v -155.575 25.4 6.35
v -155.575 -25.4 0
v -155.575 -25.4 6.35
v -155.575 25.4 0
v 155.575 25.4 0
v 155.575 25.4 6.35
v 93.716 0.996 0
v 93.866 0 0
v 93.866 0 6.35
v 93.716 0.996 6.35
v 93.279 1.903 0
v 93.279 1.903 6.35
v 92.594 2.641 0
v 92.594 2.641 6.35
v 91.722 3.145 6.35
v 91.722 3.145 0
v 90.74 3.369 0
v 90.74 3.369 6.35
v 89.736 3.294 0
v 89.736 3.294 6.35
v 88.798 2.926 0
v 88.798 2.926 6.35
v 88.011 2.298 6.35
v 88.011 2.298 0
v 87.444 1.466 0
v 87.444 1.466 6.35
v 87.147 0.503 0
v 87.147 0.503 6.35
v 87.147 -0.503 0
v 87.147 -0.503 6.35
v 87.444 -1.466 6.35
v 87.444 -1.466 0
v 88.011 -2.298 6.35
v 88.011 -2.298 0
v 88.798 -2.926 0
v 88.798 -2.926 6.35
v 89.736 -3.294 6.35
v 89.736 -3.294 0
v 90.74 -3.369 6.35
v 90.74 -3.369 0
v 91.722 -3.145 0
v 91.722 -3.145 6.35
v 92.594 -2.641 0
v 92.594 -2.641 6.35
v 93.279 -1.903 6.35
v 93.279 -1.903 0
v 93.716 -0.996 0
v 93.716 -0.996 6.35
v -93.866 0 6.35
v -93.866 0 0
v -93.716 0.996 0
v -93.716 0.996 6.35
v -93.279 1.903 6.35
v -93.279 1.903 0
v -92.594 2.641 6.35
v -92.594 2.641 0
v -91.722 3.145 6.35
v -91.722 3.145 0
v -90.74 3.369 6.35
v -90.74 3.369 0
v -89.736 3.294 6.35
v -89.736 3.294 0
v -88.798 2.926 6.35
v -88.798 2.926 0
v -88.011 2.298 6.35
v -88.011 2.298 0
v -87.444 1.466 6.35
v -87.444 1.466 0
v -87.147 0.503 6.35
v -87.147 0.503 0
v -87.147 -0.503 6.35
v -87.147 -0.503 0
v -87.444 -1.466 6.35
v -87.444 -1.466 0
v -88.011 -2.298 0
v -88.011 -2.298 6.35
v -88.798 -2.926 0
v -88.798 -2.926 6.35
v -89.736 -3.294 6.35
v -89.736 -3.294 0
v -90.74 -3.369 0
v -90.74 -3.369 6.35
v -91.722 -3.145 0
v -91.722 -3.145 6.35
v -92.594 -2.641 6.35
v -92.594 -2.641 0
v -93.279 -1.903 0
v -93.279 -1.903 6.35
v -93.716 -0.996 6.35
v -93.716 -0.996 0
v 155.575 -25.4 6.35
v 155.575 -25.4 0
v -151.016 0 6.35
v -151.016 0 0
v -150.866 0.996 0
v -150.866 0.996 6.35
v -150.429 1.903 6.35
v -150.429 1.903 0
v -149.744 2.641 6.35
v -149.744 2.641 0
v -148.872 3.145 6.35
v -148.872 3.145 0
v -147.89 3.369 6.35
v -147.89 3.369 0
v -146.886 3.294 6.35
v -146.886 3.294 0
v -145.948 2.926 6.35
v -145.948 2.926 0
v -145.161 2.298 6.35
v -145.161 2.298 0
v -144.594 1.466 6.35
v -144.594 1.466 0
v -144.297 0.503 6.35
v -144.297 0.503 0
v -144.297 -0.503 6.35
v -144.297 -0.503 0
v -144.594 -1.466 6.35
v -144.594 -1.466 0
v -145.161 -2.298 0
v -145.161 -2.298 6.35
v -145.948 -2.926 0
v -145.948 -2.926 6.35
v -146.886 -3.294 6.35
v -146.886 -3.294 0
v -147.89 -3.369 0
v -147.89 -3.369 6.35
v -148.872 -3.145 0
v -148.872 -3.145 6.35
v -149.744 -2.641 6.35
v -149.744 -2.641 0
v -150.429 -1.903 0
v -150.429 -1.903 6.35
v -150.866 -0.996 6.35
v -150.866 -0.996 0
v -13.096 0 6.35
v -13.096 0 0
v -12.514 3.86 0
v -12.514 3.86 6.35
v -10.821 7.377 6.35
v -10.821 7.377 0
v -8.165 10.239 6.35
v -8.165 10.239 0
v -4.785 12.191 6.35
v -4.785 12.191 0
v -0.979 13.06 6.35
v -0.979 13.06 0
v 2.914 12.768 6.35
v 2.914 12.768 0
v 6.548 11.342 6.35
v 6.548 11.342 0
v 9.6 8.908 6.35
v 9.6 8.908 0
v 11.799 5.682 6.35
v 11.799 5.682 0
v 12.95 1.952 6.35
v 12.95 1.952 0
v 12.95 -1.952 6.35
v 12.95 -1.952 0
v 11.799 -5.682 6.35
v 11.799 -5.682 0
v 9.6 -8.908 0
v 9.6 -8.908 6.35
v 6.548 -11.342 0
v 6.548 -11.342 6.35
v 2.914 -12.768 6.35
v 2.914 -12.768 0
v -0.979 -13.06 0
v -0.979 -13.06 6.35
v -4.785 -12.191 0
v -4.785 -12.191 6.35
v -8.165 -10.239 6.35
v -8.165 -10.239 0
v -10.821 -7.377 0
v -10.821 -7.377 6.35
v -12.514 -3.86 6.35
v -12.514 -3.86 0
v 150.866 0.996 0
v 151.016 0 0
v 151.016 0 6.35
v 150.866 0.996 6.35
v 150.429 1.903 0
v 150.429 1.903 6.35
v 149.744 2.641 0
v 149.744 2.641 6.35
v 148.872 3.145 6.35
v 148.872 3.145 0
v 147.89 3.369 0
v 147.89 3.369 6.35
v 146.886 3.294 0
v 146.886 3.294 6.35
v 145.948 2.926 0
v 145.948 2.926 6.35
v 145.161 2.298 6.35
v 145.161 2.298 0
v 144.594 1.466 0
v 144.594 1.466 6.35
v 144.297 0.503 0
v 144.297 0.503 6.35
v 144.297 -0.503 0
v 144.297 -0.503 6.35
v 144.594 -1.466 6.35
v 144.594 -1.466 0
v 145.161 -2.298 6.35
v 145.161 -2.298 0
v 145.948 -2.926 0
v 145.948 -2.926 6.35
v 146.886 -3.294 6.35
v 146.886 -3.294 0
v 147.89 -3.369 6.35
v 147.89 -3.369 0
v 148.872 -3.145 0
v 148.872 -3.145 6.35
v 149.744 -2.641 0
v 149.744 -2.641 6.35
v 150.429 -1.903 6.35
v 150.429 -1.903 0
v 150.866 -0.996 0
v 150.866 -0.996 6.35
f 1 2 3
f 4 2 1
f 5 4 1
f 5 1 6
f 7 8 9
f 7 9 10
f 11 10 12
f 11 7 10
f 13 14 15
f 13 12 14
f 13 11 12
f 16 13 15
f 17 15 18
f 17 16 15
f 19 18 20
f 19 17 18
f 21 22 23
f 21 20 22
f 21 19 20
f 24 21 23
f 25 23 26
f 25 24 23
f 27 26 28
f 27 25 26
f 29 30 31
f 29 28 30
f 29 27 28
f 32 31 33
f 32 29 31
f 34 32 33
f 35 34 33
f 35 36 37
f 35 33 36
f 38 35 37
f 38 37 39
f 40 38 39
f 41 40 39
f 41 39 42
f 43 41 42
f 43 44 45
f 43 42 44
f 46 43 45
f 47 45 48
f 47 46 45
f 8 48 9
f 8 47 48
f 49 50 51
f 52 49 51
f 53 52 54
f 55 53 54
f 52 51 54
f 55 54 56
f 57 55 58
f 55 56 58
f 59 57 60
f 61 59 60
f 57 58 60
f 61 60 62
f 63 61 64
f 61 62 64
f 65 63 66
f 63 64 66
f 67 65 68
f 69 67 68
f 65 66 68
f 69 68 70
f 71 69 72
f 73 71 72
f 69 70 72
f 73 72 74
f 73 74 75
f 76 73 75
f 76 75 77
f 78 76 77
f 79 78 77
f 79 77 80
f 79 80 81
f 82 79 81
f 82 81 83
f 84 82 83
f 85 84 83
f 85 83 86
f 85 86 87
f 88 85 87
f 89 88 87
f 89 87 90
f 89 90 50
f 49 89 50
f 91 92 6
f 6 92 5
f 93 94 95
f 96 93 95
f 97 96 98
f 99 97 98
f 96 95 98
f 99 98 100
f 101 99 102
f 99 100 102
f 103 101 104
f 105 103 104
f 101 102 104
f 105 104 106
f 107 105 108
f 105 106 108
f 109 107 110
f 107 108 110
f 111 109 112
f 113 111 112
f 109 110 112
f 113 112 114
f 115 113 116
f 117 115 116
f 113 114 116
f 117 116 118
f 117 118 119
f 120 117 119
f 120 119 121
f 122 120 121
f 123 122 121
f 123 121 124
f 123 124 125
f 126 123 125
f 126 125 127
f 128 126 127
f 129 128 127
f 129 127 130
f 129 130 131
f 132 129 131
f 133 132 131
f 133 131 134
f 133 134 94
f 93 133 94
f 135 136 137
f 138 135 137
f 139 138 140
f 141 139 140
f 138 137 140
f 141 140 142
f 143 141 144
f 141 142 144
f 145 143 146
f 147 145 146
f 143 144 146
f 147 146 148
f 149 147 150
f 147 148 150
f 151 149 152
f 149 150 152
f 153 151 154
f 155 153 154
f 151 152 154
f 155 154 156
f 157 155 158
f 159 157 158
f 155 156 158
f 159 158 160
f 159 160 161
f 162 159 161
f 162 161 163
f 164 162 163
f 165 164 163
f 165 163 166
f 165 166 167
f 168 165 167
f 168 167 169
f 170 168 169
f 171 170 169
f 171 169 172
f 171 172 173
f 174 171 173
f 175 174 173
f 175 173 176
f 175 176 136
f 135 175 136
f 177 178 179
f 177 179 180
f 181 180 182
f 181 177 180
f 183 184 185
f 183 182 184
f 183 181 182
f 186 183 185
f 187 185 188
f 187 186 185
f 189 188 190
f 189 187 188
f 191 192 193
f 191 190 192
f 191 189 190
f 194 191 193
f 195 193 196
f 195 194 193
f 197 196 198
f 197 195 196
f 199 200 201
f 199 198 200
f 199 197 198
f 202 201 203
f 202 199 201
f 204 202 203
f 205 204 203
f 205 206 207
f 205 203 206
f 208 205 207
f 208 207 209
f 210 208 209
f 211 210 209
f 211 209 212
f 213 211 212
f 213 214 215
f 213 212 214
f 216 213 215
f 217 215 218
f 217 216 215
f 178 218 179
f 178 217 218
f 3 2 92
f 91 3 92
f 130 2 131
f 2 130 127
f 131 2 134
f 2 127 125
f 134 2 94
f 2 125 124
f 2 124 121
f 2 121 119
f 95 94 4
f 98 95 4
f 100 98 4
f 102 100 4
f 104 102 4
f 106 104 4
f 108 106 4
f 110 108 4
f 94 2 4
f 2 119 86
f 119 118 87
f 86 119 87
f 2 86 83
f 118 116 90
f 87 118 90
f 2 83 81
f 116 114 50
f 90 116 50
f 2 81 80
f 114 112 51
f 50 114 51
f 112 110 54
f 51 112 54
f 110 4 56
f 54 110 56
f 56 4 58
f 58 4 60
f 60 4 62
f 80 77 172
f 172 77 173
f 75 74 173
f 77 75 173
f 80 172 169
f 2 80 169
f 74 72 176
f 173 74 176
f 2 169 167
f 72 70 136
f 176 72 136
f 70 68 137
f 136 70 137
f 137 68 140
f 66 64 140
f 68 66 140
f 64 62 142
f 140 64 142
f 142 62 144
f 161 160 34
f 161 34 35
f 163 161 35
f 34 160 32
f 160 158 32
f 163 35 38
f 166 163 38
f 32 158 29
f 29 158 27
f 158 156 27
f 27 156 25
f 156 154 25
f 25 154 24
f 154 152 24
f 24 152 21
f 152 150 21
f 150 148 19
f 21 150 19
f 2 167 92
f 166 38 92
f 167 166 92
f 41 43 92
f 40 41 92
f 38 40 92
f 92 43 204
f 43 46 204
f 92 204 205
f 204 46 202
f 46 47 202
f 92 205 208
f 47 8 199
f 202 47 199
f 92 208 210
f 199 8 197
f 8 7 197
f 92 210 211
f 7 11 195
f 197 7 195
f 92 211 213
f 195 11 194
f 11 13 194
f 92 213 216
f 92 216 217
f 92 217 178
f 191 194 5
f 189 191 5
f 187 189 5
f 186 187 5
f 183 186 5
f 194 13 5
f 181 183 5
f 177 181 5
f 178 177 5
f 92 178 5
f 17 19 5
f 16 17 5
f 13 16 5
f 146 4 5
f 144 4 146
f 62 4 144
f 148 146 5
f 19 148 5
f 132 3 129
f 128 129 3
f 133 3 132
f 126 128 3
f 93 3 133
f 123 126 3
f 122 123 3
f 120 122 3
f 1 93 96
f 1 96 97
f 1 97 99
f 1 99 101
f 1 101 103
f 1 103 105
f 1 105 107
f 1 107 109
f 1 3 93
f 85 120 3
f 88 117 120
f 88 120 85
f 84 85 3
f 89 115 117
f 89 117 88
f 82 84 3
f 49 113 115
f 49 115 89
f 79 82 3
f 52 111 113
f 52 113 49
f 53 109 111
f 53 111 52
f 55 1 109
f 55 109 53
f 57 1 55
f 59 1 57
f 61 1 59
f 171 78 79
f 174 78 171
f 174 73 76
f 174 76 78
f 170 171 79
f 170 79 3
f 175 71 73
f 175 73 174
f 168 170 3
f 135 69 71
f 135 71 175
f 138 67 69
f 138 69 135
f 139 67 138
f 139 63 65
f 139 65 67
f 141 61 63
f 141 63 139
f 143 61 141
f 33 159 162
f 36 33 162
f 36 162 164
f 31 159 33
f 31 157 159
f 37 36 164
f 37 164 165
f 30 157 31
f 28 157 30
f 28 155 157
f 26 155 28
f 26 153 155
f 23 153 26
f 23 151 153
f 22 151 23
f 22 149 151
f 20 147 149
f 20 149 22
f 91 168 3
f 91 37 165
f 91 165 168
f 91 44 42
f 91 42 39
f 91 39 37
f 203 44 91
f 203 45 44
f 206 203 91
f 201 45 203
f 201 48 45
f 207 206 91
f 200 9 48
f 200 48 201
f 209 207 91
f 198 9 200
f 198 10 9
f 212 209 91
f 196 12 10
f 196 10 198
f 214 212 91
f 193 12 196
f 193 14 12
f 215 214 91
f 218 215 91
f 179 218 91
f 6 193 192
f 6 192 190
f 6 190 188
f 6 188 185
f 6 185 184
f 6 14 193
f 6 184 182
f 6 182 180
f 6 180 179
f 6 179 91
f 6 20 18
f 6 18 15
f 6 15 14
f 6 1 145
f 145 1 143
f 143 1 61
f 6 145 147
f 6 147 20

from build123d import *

# Parameters (mm, degrees)
SKETCH1_W               = 311.15
SKETCH1_H               = 50.8
BOSS_EXTRUDE1_DEPTH     = 6.35
F_1_CLEARANCE_HOLE1_D   = 26.19248
F_1_4_CLEARANCE_HOLE1_D = 6.7564


with BuildPart() as part:
    # Sketch1 → Boss-Extrude1 (new body)
    with BuildSketch(Plane.XY):
        Rectangle(SKETCH1_W, SKETCH1_H)
    extrude(amount=BOSS_EXTRUDE1_DEPTH)

    # 1 Clearance Hole1 (through all)
    with Locations(Plane.XY.offset(6.35)):
        with Locations((0, 0)):
            Hole(F_1_CLEARANCE_HOLE1_D / 2)

    # 1/4 Clearance Hole1 (through all)
    with Locations(Plane.XY.offset(6.35)):
        with Locations((-147.6375, 0), (-90.4875, 0)):
            f_1_4_clearance_hole1 = Hole(F_1_4_CLEARANCE_HOLE1_D / 2)

    # Mirror1: 1/4 Clearance Hole1 across plane
    add(f_1_4_clearance_hole1.mirror(Plane(origin=(0, 0, 0), x_dir=(0, 0, 1), z_dir=(1, 0, 0))), mode=Mode.SUBTRACT)


solid = part.part
